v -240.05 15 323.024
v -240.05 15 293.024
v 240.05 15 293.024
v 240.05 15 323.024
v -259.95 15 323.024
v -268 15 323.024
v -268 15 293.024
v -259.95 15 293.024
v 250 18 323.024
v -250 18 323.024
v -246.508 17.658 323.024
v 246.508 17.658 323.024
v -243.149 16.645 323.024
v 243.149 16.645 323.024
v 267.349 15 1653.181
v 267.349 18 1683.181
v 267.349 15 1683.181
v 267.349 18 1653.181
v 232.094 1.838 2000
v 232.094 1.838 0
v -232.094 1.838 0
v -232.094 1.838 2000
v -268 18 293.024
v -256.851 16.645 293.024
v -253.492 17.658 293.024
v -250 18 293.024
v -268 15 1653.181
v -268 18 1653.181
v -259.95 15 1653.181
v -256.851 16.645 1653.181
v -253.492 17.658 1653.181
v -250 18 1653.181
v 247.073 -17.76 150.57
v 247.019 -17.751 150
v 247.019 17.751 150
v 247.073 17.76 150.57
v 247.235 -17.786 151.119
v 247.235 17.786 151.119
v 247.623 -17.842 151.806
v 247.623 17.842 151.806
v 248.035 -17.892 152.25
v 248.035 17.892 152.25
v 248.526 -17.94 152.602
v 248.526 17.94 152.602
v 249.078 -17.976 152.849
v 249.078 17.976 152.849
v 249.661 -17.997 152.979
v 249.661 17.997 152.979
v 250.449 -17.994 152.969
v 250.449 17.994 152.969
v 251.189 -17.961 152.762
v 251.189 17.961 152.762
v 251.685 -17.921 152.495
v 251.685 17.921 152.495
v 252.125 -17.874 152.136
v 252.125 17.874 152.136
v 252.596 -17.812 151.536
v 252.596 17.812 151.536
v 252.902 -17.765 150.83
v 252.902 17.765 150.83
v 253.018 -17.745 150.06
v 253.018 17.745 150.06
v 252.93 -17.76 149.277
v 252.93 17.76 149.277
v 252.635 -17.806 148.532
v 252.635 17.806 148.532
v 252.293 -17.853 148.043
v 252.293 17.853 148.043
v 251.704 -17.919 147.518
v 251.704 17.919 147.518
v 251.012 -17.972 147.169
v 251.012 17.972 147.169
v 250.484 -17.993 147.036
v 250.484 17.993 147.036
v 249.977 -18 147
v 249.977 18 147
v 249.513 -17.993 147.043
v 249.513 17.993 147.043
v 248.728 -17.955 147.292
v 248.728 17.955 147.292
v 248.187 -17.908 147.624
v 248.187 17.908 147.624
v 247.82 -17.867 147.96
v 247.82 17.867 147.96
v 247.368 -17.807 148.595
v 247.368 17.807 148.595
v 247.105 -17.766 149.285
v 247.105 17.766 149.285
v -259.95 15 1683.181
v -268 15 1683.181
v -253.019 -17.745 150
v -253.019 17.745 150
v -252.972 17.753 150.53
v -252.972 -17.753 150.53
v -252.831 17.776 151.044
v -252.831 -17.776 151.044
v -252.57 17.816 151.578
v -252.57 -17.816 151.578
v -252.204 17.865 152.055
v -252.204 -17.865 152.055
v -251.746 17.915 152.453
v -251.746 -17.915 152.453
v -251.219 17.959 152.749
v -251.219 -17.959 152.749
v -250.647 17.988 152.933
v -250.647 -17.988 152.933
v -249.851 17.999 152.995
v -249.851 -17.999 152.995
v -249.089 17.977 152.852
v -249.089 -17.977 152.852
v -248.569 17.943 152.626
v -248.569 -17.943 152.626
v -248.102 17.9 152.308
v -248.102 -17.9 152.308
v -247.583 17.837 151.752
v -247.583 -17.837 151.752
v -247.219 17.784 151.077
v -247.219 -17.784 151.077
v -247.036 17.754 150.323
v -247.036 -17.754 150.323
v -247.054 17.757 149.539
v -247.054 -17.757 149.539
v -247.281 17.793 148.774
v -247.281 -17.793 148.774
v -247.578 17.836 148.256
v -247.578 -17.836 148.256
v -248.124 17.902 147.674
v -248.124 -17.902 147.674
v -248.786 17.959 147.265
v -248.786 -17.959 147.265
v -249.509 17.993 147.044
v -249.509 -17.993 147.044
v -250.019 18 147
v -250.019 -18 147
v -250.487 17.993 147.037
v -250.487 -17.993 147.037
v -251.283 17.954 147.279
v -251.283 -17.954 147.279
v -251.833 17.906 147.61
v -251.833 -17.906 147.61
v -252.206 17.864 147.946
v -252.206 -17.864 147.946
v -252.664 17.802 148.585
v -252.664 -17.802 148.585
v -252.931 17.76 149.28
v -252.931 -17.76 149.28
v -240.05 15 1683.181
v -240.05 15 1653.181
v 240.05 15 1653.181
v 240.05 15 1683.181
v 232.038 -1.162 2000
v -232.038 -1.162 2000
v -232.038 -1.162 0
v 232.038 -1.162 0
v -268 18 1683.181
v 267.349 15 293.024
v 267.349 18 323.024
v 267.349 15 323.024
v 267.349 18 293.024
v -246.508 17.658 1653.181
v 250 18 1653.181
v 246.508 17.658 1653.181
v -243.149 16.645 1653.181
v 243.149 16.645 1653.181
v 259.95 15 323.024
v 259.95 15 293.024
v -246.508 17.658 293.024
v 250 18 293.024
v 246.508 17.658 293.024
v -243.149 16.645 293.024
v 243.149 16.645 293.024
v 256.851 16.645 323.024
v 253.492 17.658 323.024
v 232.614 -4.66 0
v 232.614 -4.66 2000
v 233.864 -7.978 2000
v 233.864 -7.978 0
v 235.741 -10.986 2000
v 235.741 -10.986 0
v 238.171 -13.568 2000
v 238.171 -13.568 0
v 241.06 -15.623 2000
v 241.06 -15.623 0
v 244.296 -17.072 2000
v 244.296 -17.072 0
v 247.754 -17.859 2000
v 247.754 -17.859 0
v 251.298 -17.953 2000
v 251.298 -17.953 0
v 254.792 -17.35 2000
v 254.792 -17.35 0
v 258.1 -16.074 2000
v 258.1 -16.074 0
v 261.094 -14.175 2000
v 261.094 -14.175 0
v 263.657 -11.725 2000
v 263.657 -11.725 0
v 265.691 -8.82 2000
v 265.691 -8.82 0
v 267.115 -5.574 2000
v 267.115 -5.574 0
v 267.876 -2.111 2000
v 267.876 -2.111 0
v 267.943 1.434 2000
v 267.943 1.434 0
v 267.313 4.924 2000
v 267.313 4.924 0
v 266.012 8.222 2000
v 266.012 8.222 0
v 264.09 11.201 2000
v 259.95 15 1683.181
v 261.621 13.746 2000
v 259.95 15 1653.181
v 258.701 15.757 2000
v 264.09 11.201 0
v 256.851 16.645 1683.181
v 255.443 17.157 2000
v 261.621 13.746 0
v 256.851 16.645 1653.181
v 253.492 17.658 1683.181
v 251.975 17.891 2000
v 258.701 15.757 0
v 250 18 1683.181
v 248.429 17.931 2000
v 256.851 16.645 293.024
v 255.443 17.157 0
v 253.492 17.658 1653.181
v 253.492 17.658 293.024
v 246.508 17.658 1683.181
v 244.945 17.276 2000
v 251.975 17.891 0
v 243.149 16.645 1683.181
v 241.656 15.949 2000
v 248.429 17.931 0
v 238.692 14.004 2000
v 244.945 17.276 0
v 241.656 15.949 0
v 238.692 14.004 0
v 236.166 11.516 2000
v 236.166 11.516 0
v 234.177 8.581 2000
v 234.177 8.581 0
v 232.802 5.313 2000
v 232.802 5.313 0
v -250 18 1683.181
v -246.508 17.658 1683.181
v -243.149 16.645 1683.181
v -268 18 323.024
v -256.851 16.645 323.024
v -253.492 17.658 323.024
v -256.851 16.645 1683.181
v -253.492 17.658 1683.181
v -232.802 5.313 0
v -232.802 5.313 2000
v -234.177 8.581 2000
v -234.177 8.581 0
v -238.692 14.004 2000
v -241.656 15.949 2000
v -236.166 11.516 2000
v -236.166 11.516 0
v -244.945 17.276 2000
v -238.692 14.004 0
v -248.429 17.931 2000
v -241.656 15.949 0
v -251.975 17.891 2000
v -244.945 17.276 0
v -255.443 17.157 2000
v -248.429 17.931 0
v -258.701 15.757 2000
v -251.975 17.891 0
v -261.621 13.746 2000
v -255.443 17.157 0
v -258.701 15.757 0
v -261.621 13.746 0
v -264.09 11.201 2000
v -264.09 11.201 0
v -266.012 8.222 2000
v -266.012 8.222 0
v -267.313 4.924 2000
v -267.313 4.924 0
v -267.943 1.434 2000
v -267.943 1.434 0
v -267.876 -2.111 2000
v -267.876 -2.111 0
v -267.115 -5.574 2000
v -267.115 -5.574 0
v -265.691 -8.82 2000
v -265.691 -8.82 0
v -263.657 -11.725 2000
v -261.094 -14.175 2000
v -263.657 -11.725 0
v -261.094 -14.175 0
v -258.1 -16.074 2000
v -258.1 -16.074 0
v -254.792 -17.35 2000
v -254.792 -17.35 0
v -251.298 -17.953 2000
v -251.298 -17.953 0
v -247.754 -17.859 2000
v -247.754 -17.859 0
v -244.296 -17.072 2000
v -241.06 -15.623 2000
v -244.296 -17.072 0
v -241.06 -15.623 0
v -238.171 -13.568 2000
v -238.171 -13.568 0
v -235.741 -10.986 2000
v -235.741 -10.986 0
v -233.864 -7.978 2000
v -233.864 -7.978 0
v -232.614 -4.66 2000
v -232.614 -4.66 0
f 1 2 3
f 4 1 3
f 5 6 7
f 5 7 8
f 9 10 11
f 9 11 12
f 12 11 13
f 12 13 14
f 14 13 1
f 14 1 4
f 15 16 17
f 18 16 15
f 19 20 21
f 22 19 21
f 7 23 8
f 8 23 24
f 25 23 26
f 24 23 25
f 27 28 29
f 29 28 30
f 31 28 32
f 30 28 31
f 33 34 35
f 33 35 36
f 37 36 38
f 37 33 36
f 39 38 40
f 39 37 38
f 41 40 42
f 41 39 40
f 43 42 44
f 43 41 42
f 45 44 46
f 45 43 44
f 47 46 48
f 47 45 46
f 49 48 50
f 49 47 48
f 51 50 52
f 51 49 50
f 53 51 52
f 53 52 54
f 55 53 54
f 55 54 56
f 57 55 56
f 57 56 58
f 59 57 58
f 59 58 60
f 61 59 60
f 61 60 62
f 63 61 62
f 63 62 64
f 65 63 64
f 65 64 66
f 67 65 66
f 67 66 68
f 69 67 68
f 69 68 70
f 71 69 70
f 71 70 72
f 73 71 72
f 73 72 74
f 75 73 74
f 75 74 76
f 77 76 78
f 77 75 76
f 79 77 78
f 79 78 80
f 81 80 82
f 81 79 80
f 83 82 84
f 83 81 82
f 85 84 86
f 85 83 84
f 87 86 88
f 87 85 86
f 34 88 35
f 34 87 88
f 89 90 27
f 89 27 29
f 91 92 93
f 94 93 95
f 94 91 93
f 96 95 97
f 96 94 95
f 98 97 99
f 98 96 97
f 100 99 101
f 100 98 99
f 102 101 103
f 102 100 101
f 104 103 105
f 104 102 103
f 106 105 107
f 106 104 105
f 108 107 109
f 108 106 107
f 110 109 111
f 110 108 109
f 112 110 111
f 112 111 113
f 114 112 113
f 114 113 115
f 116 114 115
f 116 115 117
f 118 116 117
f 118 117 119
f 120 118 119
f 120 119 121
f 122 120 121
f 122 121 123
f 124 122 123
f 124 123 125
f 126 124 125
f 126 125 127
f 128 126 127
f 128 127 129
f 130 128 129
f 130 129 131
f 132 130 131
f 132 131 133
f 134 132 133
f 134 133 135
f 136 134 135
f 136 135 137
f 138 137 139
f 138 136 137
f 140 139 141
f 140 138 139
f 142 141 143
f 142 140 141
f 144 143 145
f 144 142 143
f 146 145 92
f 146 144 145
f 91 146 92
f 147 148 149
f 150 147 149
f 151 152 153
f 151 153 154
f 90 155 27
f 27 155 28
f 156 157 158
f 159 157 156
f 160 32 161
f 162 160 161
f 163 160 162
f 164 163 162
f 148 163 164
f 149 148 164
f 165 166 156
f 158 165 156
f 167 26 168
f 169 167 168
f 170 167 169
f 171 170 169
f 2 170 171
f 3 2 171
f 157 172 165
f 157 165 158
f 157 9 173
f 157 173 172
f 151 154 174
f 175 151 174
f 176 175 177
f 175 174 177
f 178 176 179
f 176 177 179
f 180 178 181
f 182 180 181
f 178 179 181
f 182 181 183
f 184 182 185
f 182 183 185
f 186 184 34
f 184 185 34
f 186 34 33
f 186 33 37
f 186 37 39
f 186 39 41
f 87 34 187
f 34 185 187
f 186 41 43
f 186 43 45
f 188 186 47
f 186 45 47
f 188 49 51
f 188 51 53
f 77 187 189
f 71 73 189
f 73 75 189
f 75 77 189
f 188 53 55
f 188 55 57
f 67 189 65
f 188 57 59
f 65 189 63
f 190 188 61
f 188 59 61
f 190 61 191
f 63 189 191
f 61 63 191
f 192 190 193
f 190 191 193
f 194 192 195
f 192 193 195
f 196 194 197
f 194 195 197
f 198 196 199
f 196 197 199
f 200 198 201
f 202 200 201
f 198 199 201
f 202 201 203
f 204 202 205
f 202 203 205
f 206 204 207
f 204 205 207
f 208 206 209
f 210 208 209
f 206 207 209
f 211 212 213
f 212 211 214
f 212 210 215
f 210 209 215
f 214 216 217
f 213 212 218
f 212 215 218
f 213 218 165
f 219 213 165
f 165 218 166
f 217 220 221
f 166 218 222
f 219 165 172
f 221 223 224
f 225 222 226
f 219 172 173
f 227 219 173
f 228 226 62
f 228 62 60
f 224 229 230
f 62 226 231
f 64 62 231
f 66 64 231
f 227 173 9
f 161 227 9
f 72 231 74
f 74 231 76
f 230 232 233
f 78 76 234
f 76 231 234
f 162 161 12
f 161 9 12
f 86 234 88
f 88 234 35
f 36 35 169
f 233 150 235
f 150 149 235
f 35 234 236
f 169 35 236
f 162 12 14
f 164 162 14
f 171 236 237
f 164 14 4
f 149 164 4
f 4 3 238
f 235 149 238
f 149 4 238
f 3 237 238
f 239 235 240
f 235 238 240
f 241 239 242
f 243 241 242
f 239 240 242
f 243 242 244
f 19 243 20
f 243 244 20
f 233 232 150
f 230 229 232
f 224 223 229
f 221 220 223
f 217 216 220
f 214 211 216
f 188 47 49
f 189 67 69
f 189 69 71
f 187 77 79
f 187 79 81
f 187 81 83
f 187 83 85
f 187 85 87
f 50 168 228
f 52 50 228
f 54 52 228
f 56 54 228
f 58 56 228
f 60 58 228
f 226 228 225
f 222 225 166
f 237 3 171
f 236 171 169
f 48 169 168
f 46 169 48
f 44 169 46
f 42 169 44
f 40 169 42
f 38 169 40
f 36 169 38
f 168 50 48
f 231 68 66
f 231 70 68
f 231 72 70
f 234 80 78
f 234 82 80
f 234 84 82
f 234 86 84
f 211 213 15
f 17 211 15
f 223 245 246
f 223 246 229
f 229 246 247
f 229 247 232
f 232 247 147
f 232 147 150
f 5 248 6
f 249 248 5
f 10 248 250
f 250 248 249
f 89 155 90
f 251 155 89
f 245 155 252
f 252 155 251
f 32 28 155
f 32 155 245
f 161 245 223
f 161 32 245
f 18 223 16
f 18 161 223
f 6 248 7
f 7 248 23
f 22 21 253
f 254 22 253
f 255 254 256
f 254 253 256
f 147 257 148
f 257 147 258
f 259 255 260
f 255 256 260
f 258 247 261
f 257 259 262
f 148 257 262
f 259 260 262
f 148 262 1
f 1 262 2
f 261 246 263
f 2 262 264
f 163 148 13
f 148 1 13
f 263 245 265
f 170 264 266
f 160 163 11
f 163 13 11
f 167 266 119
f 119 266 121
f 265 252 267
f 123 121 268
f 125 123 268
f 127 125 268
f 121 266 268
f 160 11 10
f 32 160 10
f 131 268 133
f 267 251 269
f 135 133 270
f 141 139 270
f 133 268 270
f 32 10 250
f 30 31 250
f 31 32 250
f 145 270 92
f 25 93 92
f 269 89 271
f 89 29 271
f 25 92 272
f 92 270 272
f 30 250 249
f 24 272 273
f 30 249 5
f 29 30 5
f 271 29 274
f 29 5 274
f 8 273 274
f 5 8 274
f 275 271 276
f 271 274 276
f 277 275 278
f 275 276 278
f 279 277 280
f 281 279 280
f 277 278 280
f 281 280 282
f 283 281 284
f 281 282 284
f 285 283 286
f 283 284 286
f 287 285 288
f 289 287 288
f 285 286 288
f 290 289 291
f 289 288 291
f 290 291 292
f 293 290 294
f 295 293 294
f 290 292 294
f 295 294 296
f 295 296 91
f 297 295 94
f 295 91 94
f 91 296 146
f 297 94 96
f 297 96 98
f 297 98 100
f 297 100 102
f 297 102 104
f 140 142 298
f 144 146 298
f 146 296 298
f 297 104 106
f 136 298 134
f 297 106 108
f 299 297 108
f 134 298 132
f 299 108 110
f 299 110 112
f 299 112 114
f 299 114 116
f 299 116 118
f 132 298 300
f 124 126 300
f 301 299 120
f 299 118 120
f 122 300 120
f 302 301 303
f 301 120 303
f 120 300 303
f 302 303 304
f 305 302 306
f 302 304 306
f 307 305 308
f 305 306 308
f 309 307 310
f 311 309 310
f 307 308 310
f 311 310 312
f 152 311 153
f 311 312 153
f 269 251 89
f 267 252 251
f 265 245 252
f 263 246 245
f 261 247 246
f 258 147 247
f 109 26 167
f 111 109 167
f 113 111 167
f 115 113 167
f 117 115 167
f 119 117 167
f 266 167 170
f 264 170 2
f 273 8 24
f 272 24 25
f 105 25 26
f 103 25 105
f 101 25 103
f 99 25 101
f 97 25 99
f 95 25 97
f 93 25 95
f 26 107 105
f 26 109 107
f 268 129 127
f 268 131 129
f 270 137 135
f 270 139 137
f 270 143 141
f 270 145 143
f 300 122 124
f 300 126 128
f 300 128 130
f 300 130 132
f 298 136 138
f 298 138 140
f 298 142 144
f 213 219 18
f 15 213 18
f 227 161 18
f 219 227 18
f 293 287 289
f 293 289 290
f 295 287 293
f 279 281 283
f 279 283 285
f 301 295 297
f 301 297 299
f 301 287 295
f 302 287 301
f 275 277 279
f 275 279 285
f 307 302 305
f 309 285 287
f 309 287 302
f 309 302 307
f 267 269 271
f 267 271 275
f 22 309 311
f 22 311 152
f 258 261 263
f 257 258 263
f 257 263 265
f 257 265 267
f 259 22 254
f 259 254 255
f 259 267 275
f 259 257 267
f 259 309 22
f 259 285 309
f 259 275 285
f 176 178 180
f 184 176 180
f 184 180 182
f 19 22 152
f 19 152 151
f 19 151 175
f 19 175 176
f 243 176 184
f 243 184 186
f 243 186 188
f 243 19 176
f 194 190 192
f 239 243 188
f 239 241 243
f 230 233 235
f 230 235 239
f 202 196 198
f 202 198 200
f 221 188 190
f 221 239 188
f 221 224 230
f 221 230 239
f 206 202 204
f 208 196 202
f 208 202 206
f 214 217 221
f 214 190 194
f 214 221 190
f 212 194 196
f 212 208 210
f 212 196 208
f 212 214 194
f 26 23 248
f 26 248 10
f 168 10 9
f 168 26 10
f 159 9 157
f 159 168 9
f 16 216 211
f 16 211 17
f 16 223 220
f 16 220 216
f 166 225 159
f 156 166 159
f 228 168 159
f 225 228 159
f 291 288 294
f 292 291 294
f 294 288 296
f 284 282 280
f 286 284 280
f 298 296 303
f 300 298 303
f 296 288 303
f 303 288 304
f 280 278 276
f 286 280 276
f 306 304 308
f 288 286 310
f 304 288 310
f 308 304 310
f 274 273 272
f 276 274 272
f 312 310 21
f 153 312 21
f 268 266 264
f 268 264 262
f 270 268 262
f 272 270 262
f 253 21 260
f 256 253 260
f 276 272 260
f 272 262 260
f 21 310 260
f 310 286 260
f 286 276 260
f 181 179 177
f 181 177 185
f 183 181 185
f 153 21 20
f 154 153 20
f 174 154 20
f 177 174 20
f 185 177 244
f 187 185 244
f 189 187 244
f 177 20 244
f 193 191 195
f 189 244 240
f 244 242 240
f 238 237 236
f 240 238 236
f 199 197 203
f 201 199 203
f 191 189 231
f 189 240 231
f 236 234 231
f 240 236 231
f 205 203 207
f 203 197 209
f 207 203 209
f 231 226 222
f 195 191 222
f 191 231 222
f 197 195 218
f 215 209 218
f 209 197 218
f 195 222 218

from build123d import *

# Parameters (mm, degrees)
SKETCH_1_R               = 15
EXTRUDE_1_DEPTH          = 2000
EXTRUDE_1_2_DEPTH        = 2000
SKETCH_2_R               = 15
EXTRUDE_2_DEPTH          = 2000
CUT_EXTRUDE_1_DEPTH      = 2018.973628535
CUT_EXTRUDE_1_DEPTH_BACK = 2018.973628535
SKETCH_3_R               = 3
SKETCH_6_W               = 535.348800536
SKETCH_6_H               = 30
EXTRUDE_3_DEPTH          = 3


with BuildPart() as part:
    # 草图1 → 凸台-拉伸1 (new body)
    with BuildSketch(Plane.XY):
        with Locations((-250, 0)):
            Circle(SKETCH_1_R)
    extrude(amount=EXTRUDE_1_DEPTH)



with BuildPart() as body_2:
    # 草图1 → Extrude 1 2 (new body)
    with BuildSketch(Plane.XY):
        with Locations((250, 0)):
            Circle(SKETCH_1_R)
    extrude(amount=EXTRUDE_1_2_DEPTH)


with BuildPart() as part_1:
    add(part.part)

    add(body_2.part)  # 凸台-拉伸2 merges body 2
    # 草图2 → 凸台-拉伸2 (add)
    with BuildSketch(Plane(origin=(0, 0, 0), x_dir=(-1, 0, 0), z_dir=(0, 0, -1))):
        with BuildLine():
            Line((-232.09413573, 1.83848436), (232.09413573, 1.83848436))
            ThreePointArc((232.09413573, 1.83848436), (267.996794905, -0.339666233), (232.037514609, -1.16151564))
            Line((232.037514609, -1.16151564), (-232.037514609, -1.16151564))
            ThreePointArc((-232.037514609, -1.16151564), (-267.996794905, -0.339666233), (-232.09413573, 1.83848436))
        make_face()
        with Locations((-250, 0)):
            Circle(SKETCH_2_R, mode=Mode.SUBTRACT)
        with Locations((250, 0)):
            Circle(SKETCH_2_R, mode=Mode.SUBTRACT)
    extrude(amount=-EXTRUDE_2_DEPTH)

    # 草图3 → 切除-拉伸1 (cut, two sides: drawn at the far end of the back side and taken through both)
    with BuildSketch(Plane(origin=(0, 1.83848436, 0), x_dir=(1, 0, 0), z_dir=(0, 1, 0)).offset(-CUT_EXTRUDE_1_DEPTH_BACK)):
        with Locations(Location((250.018757305, -150, 0), (0, 0, 180))):
            Circle(SKETCH_3_R)
        with Locations(Location((-250.018757305, -150, 0), (0, 0, 180))):
            Circle(SKETCH_3_R)
    extrude(amount=CUT_EXTRUDE_1_DEPTH + CUT_EXTRUDE_1_DEPTH_BACK, mode=Mode.SUBTRACT)

    # 草图6 → 凸台-拉伸3 (add)
    with BuildSketch(Plane(origin=(0, 18, 0), x_dir=(1, 0, 0), z_dir=(0, 1, 0))):
        with Locations((-0.325599732, -308.023795678)):
            Rectangle(SKETCH_6_W, SKETCH_6_H)
        with Locations((-0.325599732, -1668.181126051)):
            Rectangle(SKETCH_6_W, SKETCH_6_H)
    extrude(amount=-EXTRUDE_3_DEPTH)


solid = part_1.part
